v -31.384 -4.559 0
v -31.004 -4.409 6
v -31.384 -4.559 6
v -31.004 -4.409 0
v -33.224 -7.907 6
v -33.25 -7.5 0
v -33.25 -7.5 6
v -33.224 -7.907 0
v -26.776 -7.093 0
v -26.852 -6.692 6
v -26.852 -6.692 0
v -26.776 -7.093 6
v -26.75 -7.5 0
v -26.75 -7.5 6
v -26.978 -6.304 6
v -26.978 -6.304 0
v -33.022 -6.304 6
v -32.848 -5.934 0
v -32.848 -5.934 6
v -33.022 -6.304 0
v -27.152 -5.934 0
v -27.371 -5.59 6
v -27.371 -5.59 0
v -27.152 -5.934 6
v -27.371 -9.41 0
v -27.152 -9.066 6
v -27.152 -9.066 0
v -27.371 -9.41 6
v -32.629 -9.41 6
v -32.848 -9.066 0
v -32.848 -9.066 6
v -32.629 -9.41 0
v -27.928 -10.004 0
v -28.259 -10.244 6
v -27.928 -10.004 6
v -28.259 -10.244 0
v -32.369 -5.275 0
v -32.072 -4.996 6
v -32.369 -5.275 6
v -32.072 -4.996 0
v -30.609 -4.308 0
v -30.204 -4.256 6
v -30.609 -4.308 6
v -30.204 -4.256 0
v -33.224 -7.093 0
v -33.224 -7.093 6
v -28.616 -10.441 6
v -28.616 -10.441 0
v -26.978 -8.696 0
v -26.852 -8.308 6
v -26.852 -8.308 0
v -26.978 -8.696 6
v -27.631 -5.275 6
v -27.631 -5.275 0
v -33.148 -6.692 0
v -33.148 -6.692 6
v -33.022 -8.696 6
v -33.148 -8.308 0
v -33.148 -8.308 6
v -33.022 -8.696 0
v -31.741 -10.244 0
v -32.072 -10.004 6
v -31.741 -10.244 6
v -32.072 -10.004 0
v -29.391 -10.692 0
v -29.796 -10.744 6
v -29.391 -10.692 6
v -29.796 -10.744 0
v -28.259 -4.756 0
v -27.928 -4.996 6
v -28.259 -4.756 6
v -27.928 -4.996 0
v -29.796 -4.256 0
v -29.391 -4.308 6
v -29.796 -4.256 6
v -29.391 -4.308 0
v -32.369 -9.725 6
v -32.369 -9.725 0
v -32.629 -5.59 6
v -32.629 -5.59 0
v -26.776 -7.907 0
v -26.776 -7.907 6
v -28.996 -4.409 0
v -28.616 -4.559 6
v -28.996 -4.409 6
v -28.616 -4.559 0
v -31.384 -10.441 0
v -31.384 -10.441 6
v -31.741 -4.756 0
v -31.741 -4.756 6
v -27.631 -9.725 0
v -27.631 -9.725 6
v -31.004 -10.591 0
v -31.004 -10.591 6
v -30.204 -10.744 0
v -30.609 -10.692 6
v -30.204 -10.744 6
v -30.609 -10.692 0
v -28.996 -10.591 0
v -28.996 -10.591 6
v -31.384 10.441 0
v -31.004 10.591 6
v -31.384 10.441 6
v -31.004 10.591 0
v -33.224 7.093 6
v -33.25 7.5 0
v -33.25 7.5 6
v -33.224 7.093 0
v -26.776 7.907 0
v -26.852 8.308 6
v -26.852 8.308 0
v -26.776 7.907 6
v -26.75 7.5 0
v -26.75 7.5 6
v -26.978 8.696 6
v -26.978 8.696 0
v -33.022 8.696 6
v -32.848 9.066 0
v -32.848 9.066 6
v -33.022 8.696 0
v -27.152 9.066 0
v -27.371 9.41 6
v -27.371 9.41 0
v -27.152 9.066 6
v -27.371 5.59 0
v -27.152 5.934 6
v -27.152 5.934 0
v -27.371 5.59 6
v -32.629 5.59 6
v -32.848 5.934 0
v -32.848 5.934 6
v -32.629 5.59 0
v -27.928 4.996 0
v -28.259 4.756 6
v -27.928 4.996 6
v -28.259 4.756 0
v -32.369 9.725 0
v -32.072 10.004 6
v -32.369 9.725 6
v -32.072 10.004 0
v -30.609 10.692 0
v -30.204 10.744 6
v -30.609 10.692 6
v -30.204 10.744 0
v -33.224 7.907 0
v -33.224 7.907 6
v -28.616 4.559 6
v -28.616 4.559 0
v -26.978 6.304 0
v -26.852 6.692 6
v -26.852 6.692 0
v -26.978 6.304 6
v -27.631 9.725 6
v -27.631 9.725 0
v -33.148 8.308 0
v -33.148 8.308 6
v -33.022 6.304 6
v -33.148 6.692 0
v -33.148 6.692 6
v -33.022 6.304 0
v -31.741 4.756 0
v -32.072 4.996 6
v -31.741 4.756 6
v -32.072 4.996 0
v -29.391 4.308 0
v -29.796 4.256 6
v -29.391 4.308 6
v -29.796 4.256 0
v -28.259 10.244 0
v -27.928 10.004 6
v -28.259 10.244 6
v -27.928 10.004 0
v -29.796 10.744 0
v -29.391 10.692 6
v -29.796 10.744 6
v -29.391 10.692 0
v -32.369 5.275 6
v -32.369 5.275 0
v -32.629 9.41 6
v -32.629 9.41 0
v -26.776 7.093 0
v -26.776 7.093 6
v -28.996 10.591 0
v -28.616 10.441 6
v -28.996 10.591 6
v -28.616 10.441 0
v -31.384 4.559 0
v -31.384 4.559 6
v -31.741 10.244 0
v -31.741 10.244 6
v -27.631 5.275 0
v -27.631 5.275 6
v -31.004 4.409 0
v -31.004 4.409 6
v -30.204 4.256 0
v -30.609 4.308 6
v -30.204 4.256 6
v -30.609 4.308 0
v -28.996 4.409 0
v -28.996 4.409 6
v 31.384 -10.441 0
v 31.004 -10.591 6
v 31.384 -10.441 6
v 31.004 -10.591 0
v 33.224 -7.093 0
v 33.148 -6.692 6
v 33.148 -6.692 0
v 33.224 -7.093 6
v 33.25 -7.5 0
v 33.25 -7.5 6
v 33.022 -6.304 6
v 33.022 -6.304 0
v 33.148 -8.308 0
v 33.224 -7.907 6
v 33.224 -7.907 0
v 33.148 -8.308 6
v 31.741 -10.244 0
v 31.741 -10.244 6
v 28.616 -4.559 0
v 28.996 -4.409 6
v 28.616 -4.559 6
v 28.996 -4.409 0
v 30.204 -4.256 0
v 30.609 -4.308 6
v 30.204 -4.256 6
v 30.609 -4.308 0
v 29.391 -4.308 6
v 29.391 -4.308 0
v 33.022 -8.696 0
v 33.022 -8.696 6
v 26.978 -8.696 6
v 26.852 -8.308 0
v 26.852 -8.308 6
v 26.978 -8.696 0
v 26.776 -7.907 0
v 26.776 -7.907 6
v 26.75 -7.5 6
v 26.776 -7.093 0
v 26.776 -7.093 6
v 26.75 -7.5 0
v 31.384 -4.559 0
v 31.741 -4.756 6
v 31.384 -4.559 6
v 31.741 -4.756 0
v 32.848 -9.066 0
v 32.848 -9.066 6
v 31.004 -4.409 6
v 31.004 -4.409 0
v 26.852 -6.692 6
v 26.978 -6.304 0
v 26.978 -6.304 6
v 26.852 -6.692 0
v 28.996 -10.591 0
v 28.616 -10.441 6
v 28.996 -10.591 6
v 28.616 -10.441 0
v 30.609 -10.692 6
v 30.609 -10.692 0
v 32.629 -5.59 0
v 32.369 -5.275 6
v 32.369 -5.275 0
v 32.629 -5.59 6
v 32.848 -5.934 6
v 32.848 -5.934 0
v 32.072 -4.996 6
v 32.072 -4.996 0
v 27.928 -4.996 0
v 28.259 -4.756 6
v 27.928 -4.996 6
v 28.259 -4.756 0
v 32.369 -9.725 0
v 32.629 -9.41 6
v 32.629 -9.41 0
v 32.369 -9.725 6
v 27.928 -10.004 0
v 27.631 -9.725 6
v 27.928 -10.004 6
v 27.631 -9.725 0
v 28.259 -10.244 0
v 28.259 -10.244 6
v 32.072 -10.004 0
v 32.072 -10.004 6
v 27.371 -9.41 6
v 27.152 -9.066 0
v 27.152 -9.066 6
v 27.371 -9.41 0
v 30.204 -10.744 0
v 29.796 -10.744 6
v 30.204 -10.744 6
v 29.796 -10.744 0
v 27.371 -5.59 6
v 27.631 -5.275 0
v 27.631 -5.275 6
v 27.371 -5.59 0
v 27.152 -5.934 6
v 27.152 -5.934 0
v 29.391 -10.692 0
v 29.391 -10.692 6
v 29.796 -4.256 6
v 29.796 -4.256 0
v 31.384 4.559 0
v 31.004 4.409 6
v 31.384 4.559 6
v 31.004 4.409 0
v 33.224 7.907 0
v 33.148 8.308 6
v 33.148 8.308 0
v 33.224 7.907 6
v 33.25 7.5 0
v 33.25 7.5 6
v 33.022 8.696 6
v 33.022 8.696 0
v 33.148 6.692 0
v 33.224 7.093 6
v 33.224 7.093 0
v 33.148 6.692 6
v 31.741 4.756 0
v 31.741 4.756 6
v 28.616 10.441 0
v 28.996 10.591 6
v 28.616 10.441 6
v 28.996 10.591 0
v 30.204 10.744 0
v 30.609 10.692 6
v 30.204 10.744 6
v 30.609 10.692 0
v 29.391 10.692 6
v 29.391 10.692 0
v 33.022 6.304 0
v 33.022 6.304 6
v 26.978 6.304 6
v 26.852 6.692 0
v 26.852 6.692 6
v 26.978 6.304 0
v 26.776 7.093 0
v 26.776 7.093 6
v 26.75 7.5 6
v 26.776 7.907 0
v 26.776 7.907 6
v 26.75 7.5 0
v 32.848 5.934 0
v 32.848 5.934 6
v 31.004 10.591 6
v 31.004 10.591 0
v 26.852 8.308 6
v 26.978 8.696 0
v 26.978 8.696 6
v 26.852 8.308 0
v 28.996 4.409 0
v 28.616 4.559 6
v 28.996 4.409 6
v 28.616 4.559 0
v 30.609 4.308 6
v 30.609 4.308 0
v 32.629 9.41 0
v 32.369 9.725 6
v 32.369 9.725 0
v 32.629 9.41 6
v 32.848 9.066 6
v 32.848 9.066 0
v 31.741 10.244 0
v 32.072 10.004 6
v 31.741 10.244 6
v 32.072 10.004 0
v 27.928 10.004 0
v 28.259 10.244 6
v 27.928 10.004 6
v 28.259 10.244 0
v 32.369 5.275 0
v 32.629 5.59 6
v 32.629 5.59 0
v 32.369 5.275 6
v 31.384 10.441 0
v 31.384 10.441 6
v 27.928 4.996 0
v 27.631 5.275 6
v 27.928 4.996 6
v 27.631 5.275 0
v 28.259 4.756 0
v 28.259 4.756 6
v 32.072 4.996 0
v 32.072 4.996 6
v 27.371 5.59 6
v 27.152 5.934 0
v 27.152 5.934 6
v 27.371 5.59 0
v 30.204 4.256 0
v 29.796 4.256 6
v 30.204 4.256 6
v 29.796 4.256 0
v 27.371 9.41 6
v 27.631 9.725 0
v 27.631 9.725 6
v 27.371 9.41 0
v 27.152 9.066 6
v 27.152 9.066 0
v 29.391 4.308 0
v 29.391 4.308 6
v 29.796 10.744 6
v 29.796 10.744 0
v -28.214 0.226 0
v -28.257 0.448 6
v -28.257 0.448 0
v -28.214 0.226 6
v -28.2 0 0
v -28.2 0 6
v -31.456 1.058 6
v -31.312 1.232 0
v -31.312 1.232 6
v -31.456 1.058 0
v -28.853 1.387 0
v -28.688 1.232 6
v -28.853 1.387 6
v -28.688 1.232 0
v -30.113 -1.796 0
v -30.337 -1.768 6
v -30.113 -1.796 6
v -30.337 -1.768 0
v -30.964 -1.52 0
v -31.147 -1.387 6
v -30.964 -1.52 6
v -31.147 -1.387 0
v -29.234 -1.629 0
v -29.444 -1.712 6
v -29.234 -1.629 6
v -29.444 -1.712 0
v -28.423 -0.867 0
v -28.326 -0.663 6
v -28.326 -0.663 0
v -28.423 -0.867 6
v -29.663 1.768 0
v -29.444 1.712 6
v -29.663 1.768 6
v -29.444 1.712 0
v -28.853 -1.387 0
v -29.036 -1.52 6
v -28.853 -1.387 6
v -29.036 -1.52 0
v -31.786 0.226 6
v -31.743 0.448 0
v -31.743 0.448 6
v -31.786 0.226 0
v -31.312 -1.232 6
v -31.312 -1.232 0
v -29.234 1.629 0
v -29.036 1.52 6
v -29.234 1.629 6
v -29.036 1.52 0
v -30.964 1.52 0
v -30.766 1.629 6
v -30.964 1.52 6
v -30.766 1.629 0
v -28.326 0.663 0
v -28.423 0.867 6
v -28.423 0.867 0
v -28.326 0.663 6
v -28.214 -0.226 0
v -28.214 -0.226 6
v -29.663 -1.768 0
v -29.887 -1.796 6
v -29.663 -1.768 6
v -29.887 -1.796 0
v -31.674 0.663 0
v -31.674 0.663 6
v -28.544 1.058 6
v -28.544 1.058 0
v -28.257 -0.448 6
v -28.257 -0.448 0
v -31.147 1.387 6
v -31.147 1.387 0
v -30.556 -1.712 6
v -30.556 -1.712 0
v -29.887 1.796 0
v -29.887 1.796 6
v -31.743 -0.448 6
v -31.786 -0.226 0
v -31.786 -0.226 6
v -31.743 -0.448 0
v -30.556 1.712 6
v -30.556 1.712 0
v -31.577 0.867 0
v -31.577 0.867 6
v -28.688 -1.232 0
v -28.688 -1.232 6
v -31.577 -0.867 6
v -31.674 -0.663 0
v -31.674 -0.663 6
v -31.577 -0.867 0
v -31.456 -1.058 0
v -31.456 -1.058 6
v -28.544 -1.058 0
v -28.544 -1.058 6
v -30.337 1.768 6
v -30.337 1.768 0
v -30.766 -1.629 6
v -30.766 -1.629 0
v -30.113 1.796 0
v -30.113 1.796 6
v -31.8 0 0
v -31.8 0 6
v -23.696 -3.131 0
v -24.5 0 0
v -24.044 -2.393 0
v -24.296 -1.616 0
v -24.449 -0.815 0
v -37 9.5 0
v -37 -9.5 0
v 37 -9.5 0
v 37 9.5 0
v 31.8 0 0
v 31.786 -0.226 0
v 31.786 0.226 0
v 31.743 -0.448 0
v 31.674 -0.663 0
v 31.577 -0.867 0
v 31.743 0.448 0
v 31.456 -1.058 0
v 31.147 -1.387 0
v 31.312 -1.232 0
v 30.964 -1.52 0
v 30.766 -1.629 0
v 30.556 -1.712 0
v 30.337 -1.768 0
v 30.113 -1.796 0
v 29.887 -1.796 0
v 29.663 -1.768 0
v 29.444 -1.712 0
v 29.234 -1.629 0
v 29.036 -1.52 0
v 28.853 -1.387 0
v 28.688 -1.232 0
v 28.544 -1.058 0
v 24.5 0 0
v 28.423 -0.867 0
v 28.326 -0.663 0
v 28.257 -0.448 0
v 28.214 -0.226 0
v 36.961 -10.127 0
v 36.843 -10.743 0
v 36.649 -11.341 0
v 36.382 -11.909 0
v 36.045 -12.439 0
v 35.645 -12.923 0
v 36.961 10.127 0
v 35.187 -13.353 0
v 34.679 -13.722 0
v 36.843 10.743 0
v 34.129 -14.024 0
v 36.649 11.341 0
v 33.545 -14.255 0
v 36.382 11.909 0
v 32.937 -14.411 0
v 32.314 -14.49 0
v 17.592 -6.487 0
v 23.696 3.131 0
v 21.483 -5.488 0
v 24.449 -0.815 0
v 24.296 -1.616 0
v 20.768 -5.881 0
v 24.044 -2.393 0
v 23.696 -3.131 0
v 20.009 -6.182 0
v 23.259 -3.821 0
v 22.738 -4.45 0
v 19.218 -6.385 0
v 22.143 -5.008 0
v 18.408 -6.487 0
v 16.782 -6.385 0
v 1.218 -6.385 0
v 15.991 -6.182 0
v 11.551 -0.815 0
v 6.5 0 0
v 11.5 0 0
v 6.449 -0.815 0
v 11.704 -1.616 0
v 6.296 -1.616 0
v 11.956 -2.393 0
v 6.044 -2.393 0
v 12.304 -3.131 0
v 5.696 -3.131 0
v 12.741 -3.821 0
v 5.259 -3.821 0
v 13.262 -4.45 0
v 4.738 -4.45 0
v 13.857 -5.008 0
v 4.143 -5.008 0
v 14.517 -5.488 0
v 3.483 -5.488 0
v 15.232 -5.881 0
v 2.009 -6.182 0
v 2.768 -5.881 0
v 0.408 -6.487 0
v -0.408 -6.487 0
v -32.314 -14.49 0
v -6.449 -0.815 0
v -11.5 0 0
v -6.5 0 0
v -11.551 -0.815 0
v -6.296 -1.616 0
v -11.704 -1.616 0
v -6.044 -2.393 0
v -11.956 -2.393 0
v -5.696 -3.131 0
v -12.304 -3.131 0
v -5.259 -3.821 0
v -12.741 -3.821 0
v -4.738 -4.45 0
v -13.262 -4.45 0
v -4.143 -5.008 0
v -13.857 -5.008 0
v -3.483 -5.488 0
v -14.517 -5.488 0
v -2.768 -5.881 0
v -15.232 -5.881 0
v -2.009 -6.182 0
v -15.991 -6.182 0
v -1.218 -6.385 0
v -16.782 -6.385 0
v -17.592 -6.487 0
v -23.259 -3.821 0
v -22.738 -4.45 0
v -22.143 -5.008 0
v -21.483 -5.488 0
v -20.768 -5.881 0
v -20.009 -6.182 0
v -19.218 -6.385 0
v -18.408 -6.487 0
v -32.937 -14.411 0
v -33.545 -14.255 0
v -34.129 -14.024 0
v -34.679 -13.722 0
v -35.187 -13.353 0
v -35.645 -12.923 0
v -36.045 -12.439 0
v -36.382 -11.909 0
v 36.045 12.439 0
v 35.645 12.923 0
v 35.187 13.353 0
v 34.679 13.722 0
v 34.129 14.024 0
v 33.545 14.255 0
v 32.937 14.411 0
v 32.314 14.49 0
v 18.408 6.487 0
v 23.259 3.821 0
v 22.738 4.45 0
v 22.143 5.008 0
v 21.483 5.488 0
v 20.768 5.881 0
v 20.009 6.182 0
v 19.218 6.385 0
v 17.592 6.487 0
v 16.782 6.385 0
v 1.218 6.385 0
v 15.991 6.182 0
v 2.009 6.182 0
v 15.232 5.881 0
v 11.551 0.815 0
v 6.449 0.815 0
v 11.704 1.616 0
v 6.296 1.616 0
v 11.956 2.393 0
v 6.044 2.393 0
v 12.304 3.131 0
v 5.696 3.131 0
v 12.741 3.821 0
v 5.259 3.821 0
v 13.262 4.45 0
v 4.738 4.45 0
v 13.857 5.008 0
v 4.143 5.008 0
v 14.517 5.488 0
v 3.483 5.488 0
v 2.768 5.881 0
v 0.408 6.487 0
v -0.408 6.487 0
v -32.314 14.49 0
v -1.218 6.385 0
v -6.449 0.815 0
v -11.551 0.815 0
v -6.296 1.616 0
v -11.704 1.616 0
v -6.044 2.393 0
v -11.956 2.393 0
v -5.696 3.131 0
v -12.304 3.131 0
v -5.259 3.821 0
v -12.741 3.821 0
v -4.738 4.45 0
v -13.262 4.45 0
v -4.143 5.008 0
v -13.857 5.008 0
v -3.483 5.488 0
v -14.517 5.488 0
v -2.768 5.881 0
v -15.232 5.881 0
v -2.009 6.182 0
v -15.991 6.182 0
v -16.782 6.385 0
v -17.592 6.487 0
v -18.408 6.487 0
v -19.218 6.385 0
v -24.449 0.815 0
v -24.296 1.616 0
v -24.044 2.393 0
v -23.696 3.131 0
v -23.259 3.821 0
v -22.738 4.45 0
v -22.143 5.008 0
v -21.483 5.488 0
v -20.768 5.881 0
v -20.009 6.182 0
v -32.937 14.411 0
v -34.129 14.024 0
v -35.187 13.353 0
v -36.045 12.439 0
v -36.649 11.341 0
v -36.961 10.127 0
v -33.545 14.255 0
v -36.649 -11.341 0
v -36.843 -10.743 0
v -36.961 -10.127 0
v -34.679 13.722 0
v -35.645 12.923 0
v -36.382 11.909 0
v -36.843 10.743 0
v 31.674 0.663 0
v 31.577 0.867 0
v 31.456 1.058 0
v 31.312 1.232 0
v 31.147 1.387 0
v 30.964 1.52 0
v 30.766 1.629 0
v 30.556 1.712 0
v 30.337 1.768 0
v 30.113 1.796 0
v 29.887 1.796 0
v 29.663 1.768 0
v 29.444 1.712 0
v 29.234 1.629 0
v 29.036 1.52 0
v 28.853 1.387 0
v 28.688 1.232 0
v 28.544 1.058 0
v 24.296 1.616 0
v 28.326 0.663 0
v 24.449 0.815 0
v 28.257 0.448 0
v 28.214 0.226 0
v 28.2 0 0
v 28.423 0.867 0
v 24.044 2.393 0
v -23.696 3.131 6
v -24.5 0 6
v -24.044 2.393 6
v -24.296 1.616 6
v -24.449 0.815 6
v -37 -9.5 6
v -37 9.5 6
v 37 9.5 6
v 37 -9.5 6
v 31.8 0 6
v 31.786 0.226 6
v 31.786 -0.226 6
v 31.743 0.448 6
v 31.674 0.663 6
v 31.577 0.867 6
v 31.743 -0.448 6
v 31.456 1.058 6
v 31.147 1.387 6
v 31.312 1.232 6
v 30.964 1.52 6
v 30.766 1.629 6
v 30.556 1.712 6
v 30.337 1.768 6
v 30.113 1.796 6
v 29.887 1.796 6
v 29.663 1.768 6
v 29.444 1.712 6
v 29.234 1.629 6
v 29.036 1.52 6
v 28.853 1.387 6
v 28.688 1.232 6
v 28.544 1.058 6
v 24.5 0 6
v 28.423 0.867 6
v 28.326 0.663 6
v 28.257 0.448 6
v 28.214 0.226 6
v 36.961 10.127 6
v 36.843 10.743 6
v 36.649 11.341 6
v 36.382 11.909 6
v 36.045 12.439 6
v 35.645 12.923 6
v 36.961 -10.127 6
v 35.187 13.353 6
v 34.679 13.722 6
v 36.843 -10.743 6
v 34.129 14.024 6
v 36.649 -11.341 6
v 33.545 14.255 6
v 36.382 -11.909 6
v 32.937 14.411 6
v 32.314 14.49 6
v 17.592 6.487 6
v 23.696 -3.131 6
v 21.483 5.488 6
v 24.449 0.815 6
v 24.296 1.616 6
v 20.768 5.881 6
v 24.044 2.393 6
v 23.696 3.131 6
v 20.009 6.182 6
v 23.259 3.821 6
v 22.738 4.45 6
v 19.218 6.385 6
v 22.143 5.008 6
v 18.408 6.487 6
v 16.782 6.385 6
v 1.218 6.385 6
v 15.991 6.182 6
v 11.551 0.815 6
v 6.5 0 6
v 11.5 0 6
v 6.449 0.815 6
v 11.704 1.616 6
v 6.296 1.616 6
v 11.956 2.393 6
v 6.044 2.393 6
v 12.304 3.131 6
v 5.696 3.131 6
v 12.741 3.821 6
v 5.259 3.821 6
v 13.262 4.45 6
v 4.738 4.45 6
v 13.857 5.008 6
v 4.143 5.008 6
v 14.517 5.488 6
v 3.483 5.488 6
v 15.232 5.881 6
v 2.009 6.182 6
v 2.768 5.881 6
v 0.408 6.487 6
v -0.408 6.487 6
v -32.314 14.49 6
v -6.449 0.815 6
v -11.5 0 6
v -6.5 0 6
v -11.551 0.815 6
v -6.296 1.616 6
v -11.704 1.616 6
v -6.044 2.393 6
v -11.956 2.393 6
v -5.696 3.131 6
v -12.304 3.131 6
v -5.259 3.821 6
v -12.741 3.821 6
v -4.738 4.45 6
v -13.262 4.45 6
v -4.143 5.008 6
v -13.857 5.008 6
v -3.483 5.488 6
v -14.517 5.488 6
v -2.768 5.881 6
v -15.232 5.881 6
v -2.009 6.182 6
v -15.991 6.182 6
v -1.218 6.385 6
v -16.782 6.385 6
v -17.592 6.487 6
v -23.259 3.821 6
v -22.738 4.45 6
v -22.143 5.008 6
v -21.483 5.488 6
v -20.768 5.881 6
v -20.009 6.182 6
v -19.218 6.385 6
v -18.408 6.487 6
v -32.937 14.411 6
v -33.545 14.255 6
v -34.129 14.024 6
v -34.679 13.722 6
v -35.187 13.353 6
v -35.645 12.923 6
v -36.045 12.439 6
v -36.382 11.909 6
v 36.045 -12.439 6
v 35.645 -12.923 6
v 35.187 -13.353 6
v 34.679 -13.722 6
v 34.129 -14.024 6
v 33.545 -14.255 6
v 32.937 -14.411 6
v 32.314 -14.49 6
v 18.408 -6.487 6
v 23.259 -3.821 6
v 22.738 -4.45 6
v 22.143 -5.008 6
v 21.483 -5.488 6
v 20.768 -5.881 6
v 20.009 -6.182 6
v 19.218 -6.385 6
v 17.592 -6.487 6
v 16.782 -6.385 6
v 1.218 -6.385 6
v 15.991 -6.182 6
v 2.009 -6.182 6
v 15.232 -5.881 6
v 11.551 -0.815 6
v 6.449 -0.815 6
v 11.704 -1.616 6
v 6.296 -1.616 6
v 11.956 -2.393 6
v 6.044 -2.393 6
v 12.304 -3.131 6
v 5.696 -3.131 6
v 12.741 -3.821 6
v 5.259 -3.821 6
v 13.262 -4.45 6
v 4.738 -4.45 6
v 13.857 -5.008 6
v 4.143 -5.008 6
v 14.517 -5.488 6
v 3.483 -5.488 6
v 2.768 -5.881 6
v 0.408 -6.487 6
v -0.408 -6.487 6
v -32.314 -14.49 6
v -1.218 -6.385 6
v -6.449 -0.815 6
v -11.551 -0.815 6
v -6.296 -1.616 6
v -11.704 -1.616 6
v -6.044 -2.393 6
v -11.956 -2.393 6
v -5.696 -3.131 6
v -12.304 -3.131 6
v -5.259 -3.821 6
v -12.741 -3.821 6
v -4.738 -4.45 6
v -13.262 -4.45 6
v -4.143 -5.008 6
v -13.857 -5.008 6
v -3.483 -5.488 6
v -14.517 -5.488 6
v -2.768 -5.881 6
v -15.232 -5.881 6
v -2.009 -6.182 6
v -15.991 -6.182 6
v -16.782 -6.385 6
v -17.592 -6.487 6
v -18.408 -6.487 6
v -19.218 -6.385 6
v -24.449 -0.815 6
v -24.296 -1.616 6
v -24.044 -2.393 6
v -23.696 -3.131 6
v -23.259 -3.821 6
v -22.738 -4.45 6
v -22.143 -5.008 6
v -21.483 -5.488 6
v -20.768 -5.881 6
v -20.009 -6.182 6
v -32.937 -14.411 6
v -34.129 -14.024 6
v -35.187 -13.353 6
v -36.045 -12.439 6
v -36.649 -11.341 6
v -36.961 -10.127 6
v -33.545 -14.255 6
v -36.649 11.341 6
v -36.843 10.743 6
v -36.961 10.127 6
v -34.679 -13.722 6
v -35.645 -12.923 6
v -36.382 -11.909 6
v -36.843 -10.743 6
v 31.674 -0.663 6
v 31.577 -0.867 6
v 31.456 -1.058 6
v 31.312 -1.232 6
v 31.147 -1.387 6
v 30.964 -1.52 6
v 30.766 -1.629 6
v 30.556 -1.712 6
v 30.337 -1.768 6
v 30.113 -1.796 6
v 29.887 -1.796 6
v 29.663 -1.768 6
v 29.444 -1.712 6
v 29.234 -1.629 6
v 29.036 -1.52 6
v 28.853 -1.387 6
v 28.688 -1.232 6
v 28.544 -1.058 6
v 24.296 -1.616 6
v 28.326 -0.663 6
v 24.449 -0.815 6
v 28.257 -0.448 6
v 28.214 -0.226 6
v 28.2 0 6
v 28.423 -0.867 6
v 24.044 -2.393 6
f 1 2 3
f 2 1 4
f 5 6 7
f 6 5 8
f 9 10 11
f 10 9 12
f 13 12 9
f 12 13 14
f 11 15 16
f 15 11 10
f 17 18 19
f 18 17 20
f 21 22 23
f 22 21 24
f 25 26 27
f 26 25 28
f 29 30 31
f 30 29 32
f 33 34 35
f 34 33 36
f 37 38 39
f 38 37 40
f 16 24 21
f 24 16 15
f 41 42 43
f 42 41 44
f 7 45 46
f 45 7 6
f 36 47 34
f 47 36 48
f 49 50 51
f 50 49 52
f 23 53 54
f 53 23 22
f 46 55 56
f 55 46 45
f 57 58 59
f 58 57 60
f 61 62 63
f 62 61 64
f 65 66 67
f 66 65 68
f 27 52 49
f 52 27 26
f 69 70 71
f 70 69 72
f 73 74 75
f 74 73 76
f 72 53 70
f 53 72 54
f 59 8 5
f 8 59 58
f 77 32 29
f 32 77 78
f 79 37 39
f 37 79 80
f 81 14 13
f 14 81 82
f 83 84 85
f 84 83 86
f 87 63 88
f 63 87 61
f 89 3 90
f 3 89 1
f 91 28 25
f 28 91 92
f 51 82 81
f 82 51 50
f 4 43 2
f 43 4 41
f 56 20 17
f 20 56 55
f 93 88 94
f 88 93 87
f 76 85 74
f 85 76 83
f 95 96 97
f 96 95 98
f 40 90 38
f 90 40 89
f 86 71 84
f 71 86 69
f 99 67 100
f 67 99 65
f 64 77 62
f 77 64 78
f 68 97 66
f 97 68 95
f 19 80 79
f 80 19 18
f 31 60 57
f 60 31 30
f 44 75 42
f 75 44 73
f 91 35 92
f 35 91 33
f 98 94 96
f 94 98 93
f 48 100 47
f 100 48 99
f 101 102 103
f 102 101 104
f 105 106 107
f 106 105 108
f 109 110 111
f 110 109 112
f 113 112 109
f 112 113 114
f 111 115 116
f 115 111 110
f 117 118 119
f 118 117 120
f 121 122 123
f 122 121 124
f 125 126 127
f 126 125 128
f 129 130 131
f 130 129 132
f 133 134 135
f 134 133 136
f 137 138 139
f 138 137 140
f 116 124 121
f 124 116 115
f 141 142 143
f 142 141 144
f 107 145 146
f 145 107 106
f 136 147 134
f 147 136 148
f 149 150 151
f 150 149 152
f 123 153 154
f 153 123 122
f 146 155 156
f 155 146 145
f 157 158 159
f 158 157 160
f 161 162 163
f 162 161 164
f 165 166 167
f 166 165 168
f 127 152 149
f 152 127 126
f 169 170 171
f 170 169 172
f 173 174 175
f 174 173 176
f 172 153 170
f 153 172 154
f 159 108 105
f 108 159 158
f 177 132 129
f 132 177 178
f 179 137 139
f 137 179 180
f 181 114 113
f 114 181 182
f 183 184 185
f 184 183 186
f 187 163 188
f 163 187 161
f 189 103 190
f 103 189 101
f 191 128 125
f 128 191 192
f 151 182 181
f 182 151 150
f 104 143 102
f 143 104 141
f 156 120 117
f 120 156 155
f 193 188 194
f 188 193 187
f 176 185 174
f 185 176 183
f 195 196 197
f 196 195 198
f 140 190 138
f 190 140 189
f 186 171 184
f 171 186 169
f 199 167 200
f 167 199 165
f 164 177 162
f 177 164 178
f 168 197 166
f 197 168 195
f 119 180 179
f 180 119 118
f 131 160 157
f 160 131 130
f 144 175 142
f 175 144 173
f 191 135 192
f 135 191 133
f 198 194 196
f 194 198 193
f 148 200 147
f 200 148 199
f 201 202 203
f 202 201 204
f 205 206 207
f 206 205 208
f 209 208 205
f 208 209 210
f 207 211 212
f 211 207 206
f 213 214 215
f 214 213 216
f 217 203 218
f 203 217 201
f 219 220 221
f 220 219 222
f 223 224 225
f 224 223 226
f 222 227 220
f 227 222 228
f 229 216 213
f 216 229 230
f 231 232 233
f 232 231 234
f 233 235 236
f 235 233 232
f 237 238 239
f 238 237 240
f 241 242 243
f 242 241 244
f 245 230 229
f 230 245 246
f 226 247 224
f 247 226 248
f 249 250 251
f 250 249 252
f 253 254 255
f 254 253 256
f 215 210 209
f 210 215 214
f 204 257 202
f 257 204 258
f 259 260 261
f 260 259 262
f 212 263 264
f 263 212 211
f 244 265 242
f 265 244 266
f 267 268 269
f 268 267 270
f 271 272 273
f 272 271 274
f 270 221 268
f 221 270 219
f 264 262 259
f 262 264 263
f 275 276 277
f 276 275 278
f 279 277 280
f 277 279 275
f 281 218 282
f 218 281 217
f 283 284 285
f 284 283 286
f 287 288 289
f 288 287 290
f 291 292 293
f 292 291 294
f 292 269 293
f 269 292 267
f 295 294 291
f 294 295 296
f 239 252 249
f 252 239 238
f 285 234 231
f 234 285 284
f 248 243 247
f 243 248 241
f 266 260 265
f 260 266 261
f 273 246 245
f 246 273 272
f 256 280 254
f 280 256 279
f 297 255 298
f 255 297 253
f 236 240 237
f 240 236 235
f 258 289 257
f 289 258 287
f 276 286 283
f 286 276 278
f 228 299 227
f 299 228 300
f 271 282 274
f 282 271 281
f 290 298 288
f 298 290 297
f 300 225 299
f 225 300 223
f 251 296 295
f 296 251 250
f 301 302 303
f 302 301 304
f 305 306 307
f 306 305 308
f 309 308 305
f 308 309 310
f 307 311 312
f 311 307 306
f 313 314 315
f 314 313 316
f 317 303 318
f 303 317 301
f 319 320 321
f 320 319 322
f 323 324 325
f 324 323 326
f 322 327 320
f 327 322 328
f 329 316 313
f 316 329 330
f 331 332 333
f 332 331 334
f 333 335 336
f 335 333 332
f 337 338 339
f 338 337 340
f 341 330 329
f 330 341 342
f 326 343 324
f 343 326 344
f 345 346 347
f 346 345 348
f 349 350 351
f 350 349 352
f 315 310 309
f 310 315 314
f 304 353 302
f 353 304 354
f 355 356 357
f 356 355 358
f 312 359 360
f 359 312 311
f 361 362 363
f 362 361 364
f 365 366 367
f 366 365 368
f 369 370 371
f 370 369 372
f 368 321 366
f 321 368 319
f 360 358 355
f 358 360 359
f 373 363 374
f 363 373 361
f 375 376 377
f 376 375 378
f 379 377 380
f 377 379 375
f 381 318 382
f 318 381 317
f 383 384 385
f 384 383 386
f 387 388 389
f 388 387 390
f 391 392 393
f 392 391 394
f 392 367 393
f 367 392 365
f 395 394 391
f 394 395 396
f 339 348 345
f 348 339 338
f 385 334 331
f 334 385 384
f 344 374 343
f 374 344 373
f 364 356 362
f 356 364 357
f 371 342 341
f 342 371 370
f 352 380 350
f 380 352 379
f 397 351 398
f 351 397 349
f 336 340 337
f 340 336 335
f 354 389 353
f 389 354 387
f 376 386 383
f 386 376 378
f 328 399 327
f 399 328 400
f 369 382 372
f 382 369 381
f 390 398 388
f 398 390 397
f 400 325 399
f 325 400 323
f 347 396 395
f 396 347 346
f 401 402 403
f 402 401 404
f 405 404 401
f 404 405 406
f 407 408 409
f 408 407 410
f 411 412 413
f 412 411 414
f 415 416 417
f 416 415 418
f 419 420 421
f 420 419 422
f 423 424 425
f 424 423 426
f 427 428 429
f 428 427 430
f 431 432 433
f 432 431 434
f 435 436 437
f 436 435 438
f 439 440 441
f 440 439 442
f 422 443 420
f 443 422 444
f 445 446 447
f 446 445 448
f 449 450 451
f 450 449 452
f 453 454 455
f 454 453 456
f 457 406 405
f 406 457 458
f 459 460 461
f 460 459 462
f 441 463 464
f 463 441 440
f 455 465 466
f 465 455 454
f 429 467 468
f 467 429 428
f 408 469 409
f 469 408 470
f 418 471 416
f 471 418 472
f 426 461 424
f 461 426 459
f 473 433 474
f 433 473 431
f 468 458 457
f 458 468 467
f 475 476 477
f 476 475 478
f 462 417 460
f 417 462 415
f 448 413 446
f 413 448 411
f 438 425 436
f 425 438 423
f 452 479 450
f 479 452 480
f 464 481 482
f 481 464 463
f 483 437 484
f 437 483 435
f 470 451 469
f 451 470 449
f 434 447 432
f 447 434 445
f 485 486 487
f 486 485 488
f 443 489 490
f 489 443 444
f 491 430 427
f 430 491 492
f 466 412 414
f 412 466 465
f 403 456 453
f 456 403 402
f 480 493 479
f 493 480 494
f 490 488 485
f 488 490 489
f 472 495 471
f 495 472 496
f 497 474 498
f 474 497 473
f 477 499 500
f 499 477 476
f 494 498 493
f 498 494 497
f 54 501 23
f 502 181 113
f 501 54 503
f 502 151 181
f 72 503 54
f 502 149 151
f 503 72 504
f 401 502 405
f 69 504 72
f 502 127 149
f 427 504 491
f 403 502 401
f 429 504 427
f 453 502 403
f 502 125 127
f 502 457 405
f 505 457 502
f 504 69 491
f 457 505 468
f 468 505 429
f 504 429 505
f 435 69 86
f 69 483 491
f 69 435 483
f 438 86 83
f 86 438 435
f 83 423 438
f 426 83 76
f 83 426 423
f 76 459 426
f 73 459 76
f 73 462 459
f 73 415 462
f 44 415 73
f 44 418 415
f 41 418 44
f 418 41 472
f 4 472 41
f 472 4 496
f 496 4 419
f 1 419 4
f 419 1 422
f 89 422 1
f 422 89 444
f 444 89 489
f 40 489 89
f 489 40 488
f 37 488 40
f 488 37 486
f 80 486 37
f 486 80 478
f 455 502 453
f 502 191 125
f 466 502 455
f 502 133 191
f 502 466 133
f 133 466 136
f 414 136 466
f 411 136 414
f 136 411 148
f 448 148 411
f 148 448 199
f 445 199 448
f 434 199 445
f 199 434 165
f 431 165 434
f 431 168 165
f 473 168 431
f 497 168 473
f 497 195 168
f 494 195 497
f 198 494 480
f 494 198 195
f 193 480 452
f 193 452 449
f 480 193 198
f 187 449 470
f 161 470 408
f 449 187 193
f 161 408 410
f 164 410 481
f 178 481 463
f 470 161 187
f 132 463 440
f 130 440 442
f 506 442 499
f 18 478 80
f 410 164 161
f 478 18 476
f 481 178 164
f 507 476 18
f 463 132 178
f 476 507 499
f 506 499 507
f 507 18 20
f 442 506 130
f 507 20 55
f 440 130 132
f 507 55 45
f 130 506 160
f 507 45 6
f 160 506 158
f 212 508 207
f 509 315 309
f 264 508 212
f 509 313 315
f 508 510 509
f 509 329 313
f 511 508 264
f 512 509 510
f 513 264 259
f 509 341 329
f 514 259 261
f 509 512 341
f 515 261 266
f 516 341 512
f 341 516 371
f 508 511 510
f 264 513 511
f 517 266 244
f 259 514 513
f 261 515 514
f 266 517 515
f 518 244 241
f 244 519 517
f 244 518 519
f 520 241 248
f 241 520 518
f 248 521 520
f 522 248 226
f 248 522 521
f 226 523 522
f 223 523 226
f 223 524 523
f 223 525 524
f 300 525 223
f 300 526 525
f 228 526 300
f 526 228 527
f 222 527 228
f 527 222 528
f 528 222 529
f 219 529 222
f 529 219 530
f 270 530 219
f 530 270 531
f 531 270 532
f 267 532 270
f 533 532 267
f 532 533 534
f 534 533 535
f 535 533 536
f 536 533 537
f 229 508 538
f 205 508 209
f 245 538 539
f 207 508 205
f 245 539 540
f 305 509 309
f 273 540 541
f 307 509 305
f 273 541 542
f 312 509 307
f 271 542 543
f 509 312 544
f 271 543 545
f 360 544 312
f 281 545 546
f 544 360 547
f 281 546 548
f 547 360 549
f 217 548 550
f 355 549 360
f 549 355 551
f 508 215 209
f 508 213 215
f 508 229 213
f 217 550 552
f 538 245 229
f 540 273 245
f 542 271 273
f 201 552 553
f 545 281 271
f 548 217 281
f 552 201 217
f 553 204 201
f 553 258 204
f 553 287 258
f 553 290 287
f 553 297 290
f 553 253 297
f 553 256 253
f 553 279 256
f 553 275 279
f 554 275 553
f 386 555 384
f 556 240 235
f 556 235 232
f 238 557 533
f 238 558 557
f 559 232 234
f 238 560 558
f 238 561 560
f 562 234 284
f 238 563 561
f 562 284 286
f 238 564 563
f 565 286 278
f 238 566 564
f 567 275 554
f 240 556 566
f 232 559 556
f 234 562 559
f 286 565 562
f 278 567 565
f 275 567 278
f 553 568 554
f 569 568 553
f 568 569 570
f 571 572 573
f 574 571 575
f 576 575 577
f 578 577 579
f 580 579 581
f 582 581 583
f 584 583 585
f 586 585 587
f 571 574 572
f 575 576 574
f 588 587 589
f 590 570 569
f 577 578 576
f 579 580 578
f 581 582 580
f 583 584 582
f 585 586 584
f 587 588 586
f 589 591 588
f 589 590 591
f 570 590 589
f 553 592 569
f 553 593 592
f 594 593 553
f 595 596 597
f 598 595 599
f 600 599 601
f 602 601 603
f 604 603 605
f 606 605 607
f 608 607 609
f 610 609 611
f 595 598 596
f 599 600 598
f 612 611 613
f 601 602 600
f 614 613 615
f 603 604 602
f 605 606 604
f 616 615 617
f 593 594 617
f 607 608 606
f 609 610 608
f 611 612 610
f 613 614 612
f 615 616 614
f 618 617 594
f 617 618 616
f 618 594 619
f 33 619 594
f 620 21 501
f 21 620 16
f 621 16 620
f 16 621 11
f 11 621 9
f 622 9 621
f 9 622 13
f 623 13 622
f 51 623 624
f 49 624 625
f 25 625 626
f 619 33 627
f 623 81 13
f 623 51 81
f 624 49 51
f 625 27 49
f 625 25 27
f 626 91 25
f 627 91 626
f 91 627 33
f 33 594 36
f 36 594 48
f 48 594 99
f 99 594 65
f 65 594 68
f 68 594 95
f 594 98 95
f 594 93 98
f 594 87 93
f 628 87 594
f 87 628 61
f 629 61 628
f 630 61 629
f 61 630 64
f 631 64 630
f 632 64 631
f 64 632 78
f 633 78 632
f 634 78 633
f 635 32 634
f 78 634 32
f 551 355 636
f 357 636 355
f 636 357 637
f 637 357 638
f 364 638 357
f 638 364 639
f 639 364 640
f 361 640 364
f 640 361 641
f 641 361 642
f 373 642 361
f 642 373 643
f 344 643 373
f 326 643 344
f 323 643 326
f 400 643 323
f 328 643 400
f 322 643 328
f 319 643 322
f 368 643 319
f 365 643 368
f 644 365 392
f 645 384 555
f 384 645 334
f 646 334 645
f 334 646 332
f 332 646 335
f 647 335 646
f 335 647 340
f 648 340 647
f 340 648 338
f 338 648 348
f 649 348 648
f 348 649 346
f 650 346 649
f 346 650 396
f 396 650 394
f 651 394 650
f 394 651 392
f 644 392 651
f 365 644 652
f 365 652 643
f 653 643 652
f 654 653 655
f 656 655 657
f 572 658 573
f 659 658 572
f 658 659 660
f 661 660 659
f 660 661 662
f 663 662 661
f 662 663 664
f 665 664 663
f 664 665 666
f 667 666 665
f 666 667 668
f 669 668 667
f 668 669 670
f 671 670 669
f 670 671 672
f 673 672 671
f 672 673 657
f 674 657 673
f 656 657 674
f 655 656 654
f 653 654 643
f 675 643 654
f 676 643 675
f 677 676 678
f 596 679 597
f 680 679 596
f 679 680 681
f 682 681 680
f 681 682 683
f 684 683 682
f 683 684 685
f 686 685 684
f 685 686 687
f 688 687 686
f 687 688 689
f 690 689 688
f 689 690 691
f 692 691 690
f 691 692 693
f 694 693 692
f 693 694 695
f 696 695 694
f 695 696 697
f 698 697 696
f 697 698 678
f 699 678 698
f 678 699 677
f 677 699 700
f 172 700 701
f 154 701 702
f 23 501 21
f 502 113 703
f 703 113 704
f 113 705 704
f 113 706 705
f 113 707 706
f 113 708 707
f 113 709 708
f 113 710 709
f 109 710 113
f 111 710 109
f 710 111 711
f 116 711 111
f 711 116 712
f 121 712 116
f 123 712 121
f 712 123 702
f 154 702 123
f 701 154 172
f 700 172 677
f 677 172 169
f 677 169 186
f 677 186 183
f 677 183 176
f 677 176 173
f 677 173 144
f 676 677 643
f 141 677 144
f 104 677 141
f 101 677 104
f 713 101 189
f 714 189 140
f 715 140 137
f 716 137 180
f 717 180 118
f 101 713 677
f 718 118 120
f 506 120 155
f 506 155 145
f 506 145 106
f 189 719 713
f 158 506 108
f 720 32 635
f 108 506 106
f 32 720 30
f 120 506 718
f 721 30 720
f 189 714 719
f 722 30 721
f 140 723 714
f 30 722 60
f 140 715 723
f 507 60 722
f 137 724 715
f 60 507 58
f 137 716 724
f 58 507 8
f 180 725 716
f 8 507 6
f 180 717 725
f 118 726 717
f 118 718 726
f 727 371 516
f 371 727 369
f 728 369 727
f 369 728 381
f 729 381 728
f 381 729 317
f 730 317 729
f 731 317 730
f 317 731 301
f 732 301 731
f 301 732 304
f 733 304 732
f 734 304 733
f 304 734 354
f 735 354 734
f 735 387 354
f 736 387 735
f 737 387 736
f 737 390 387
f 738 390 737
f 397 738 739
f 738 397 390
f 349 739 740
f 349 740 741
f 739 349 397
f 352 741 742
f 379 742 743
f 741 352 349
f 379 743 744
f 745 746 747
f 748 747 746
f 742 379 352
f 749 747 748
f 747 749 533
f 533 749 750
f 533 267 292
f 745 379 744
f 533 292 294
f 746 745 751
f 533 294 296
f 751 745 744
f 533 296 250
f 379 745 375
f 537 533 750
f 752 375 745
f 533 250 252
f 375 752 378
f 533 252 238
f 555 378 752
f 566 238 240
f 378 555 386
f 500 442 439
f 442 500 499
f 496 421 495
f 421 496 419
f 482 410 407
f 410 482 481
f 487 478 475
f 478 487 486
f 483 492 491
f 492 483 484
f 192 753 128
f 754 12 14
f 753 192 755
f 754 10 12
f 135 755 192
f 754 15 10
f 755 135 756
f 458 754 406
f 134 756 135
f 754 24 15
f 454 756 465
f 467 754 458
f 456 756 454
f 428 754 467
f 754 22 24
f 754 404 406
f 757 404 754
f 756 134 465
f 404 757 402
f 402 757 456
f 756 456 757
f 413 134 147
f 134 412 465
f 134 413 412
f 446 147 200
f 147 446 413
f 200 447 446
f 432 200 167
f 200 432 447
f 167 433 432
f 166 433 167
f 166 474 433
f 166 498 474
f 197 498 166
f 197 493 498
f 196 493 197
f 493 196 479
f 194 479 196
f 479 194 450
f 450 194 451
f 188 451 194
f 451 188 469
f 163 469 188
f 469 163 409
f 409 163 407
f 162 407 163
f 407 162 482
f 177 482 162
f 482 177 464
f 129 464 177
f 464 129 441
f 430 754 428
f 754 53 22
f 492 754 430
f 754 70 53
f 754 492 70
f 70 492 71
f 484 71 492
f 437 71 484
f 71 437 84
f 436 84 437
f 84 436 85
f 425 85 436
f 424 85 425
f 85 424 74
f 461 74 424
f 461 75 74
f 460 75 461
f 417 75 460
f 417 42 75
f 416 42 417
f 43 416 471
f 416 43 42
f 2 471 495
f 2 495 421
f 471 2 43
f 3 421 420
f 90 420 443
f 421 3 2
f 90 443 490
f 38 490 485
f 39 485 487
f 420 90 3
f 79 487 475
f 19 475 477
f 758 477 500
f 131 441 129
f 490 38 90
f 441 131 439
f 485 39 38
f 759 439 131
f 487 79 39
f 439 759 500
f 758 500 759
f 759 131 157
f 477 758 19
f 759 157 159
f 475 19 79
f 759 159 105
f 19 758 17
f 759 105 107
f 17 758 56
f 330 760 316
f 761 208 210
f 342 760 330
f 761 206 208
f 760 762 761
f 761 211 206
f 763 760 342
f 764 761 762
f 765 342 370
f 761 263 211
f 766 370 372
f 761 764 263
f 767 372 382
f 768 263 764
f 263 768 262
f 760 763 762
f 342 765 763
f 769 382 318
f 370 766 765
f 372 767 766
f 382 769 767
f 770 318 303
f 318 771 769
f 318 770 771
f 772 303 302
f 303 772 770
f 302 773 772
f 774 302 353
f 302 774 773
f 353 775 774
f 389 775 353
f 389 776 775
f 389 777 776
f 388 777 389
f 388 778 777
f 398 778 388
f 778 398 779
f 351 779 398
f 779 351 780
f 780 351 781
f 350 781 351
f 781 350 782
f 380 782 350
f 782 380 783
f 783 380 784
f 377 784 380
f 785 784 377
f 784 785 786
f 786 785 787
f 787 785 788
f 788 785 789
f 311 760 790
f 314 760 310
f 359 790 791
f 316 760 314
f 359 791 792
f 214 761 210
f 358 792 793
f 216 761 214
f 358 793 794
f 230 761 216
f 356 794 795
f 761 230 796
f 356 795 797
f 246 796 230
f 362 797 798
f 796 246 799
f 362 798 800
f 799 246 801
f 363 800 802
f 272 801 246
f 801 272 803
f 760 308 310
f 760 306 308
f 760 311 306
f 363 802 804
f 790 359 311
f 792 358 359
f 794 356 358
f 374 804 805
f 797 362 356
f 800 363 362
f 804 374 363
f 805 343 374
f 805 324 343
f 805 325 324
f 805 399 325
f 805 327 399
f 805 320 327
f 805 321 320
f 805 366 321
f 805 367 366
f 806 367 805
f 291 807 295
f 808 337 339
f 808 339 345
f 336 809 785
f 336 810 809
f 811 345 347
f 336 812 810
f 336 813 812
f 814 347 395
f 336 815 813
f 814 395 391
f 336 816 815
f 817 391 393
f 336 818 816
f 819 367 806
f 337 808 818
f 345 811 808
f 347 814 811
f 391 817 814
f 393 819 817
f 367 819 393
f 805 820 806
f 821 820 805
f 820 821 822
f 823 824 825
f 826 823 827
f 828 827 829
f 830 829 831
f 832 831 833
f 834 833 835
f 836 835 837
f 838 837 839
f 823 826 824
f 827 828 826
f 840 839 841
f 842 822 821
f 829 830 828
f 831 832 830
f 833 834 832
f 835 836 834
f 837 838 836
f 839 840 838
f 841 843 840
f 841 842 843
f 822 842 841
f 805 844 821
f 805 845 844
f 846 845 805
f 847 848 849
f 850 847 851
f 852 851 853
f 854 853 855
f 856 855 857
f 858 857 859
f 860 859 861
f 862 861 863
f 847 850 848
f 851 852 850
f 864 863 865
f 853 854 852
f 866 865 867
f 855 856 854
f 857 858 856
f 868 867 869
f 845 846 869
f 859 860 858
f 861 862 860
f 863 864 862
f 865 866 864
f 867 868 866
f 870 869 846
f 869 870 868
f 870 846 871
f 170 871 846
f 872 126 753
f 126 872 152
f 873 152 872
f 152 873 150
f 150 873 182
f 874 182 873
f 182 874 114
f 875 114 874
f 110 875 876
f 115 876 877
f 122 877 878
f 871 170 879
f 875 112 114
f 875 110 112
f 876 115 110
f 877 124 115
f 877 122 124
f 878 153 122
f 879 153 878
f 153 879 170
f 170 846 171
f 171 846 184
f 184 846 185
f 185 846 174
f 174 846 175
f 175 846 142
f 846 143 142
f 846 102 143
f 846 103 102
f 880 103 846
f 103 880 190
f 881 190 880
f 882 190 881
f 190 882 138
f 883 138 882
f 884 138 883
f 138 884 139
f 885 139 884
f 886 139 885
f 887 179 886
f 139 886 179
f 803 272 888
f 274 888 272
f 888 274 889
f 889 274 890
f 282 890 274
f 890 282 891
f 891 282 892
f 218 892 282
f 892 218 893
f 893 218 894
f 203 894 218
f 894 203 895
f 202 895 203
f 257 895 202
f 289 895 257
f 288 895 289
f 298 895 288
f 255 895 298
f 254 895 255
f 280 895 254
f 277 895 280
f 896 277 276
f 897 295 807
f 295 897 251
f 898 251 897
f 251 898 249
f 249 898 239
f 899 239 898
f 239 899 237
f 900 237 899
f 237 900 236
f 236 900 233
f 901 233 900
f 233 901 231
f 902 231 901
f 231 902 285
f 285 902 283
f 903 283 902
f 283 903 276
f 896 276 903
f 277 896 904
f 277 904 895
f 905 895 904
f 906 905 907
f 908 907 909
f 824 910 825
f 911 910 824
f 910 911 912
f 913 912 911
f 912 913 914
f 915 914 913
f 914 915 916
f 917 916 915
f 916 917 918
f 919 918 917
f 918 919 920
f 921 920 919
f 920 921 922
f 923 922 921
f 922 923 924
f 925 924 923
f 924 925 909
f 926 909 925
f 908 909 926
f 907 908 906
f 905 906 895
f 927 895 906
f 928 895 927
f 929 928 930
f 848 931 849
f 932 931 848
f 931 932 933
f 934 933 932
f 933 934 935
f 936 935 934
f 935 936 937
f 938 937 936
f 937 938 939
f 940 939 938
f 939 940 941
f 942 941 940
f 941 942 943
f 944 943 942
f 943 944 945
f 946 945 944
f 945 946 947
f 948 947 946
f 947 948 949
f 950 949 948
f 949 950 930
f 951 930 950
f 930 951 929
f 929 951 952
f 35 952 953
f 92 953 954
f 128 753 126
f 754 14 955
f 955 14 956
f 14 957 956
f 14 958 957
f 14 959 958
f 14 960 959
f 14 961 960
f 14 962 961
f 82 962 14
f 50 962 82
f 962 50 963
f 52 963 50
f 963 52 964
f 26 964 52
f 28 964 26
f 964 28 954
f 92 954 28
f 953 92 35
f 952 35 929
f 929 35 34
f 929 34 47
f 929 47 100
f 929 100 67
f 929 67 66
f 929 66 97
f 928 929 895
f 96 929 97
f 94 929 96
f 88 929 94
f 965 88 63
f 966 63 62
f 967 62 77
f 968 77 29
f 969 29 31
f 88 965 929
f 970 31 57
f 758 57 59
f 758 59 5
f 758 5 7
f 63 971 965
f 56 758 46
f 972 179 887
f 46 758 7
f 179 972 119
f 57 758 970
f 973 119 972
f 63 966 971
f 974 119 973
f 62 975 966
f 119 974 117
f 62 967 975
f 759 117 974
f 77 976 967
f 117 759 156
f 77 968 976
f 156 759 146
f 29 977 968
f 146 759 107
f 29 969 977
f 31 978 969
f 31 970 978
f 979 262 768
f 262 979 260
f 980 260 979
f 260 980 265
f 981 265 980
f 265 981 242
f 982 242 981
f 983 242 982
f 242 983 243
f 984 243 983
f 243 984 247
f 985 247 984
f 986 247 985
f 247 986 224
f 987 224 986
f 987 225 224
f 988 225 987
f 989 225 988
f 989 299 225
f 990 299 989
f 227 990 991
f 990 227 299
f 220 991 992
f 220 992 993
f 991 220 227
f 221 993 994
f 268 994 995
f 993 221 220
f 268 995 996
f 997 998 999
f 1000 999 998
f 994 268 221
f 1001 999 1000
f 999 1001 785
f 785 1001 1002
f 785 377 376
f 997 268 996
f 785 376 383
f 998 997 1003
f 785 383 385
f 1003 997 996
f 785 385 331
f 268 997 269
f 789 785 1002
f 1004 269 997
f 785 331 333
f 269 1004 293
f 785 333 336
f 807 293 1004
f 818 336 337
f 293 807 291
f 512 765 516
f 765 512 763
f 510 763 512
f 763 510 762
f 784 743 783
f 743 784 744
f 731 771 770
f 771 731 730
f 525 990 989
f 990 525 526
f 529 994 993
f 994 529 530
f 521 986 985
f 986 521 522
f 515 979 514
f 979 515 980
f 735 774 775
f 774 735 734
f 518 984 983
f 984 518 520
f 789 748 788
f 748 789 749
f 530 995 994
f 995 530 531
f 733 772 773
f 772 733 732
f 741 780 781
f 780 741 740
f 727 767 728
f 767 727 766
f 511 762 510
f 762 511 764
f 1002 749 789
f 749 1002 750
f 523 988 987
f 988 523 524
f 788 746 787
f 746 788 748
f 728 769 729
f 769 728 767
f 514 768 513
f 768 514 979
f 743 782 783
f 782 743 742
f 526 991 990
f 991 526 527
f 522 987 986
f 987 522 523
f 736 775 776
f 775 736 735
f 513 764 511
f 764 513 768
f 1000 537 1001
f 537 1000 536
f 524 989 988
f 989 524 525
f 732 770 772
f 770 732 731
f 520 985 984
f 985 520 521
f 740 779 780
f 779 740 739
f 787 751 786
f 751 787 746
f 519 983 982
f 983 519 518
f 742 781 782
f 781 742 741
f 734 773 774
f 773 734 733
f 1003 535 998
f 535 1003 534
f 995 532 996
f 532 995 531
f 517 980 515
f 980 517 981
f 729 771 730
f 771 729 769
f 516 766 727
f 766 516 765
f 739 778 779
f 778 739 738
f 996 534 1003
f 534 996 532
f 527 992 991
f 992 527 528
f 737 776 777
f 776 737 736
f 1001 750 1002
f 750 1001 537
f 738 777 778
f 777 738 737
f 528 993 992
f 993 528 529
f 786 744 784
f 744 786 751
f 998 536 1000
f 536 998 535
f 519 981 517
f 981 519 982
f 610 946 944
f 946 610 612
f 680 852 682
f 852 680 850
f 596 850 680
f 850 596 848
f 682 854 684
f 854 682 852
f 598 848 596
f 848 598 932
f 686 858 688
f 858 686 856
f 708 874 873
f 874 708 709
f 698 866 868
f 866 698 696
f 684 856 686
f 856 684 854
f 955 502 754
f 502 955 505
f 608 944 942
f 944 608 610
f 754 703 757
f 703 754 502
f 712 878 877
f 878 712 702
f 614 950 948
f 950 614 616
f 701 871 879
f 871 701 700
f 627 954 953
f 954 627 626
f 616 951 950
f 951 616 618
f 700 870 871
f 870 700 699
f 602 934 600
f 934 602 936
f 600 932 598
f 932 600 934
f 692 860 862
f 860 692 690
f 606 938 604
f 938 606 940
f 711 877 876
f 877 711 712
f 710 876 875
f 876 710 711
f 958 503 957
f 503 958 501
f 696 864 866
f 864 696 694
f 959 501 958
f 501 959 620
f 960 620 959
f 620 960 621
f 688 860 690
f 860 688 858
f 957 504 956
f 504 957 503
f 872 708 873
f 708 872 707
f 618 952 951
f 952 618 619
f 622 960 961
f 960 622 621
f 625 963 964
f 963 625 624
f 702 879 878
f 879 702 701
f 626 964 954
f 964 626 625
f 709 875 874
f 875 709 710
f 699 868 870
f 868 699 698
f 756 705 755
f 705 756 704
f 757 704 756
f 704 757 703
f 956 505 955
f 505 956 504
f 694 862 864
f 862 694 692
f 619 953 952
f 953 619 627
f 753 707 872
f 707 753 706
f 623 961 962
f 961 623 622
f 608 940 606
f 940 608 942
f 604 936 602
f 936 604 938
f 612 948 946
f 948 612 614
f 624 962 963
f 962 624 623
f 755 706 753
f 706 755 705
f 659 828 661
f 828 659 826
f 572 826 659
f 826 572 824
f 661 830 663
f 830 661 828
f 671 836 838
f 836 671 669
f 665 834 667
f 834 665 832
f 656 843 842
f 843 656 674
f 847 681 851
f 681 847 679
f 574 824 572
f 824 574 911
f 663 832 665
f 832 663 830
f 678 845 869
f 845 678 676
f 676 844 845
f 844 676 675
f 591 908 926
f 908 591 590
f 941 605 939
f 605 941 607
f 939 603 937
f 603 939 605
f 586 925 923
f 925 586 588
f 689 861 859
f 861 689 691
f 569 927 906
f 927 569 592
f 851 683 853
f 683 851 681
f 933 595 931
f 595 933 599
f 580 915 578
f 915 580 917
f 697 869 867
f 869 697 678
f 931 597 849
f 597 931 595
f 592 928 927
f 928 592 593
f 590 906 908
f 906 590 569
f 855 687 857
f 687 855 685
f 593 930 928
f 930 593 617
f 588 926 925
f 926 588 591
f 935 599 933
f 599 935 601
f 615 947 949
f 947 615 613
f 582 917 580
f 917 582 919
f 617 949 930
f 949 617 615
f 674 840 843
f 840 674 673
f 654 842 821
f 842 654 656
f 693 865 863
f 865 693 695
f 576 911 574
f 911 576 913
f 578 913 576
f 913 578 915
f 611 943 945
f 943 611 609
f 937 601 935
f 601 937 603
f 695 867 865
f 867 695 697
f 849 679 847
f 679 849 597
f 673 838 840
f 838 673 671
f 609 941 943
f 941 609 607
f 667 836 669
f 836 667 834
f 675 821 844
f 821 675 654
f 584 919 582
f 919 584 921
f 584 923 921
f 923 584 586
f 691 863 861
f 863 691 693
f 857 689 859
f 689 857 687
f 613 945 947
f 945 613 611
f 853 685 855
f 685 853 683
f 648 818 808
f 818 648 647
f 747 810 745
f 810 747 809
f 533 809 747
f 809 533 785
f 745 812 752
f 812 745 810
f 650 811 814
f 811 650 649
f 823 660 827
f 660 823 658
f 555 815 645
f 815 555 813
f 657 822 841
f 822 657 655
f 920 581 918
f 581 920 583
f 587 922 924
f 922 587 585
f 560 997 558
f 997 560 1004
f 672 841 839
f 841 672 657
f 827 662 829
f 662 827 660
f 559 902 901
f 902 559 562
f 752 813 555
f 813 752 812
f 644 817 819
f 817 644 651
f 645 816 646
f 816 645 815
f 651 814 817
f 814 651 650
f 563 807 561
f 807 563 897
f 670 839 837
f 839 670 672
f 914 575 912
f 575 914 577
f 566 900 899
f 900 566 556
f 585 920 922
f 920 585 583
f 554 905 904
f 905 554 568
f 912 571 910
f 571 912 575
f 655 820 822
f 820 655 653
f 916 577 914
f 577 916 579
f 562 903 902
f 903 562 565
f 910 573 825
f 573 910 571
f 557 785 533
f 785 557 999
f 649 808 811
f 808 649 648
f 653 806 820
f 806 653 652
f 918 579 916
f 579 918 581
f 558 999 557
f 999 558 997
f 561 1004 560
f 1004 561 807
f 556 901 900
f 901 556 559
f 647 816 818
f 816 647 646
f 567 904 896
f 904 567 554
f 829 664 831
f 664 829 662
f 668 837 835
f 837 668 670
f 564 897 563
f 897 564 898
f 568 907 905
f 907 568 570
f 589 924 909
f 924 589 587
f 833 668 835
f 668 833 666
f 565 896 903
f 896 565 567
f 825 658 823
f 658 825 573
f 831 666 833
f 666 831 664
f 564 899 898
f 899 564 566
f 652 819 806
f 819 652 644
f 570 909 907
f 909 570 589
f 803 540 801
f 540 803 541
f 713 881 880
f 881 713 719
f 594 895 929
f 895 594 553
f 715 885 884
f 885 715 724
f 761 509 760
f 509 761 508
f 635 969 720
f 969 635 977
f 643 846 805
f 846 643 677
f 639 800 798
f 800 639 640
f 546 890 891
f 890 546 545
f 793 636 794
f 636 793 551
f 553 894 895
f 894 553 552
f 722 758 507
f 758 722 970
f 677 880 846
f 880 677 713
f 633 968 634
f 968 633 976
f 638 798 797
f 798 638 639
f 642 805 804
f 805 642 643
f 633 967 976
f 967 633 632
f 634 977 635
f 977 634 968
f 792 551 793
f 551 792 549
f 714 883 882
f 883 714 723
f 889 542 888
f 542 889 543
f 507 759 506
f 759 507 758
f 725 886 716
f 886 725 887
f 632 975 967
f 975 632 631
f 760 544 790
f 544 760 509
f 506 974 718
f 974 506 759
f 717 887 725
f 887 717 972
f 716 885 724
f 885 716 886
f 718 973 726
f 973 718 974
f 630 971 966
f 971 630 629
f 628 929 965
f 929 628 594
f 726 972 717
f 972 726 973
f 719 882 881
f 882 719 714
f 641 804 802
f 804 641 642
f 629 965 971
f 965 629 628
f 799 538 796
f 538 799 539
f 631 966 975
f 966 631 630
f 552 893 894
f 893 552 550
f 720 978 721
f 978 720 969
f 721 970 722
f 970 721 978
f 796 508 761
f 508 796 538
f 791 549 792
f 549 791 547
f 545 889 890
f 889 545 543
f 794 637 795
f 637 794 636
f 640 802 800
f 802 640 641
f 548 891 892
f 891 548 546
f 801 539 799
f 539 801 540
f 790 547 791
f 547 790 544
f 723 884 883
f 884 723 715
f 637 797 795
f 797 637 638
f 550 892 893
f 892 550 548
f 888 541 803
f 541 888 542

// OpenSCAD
$fn = 50;


difference() {
	union() {
		hull() {
			translate(v = [-32.0000000000, 9.5000000000, 0]) {
				cylinder(h = 6, r = 5);
			}
			translate(v = [32.0000000000, 9.5000000000, 0]) {
				cylinder(h = 6, r = 5);
			}
			translate(v = [-32.0000000000, -9.5000000000, 0]) {
				cylinder(h = 6, r = 5);
			}
			translate(v = [32.0000000000, -9.5000000000, 0]) {
				cylinder(h = 6, r = 5);
			}
		}
	}
	union() {
		#translate(v = [-30.0000000000, -7.5000000000, 0]) {
			cylinder(h = 6, r = 3.2500000000);
		}
		#translate(v = [-30.0000000000, 7.5000000000, 0]) {
			cylinder(h = 6, r = 3.2500000000);
		}
		#translate(v = [30.0000000000, -7.5000000000, 0]) {
			cylinder(h = 6, r = 3.2500000000);
		}
		#translate(v = [30.0000000000, 7.5000000000, 0]) {
			cylinder(h = 6, r = 3.2500000000);
		}
		#translate(v = [-30.0000000000, -7.5000000000, -100.0000000000]) {
			cylinder(h = 200, r = 3.2500000000);
		}
		#translate(v = [-30.0000000000, 7.5000000000, -100.0000000000]) {
			cylinder(h = 200, r = 3.2500000000);
		}
		#translate(v = [30.0000000000, -7.5000000000, -100.0000000000]) {
			cylinder(h = 200, r = 3.2500000000);
		}
		#translate(v = [30.0000000000, 7.5000000000, -100.0000000000]) {
			cylinder(h = 200, r = 3.2500000000);
		}
		#translate(v = [-30.0000000000, -7.5000000000, 0]) {
			cylinder(h = 6, r = 1.8000000000);
		}
		#translate(v = [-30.0000000000, 0.0000000000, 0]) {
			cylinder(h = 6, r = 1.8000000000);
		}
		#translate(v = [-30.0000000000, 7.5000000000, 0]) {
			cylinder(h = 6, r = 1.8000000000);
		}
		#translate(v = [30.0000000000, -7.5000000000, 0]) {
			cylinder(h = 6, r = 1.8000000000);
		}
		#translate(v = [30.0000000000, 0.0000000000, 0]) {
			cylinder(h = 6, r = 1.8000000000);
		}
		#translate(v = [30.0000000000, 7.5000000000, 0]) {
			cylinder(h = 6, r = 1.8000000000);
		}
		#translate(v = [-30.0000000000, -7.5000000000, 0]) {
			cylinder(h = 6, r = 1.8000000000);
		}
		#translate(v = [-30.0000000000, 0.0000000000, 0]) {
			cylinder(h = 6, r = 1.8000000000);
		}
		#translate(v = [-30.0000000000, 7.5000000000, 0]) {
			cylinder(h = 6, r = 1.8000000000);
		}
		#translate(v = [30.0000000000, -7.5000000000, 0]) {
			cylinder(h = 6, r = 1.8000000000);
		}
		#translate(v = [30.0000000000, 0.0000000000, 0]) {
			cylinder(h = 6, r = 1.8000000000);
		}
		#translate(v = [30.0000000000, 7.5000000000, 0]) {
			cylinder(h = 6, r = 1.8000000000);
		}
		#translate(v = [-30.0000000000, -7.5000000000, 0]) {
			cylinder(h = 6, r = 1.8000000000);
		}
		#translate(v = [-30.0000000000, 0.0000000000, 0]) {
			cylinder(h = 6, r = 1.8000000000);
		}
		#translate(v = [-30.0000000000, 7.5000000000, 0]) {
			cylinder(h = 6, r = 1.8000000000);
		}
		#translate(v = [30.0000000000, -7.5000000000, 0]) {
			cylinder(h = 6, r = 1.8000000000);
		}
		#translate(v = [30.0000000000, 0.0000000000, 0]) {
			cylinder(h = 6, r = 1.8000000000);
		}
		#translate(v = [30.0000000000, 7.5000000000, 0]) {
			cylinder(h = 6, r = 1.8000000000);
		}
		#translate(v = [-18.0000000000, 0, 0]) {
			cylinder(h = 6, r = 6.5000000000);
		}
		#cylinder(h = 6, r = 6.5000000000);
		#translate(v = [18.0000000000, 0, 0]) {
			cylinder(h = 6, r = 6.5000000000);
		}
	}
}
